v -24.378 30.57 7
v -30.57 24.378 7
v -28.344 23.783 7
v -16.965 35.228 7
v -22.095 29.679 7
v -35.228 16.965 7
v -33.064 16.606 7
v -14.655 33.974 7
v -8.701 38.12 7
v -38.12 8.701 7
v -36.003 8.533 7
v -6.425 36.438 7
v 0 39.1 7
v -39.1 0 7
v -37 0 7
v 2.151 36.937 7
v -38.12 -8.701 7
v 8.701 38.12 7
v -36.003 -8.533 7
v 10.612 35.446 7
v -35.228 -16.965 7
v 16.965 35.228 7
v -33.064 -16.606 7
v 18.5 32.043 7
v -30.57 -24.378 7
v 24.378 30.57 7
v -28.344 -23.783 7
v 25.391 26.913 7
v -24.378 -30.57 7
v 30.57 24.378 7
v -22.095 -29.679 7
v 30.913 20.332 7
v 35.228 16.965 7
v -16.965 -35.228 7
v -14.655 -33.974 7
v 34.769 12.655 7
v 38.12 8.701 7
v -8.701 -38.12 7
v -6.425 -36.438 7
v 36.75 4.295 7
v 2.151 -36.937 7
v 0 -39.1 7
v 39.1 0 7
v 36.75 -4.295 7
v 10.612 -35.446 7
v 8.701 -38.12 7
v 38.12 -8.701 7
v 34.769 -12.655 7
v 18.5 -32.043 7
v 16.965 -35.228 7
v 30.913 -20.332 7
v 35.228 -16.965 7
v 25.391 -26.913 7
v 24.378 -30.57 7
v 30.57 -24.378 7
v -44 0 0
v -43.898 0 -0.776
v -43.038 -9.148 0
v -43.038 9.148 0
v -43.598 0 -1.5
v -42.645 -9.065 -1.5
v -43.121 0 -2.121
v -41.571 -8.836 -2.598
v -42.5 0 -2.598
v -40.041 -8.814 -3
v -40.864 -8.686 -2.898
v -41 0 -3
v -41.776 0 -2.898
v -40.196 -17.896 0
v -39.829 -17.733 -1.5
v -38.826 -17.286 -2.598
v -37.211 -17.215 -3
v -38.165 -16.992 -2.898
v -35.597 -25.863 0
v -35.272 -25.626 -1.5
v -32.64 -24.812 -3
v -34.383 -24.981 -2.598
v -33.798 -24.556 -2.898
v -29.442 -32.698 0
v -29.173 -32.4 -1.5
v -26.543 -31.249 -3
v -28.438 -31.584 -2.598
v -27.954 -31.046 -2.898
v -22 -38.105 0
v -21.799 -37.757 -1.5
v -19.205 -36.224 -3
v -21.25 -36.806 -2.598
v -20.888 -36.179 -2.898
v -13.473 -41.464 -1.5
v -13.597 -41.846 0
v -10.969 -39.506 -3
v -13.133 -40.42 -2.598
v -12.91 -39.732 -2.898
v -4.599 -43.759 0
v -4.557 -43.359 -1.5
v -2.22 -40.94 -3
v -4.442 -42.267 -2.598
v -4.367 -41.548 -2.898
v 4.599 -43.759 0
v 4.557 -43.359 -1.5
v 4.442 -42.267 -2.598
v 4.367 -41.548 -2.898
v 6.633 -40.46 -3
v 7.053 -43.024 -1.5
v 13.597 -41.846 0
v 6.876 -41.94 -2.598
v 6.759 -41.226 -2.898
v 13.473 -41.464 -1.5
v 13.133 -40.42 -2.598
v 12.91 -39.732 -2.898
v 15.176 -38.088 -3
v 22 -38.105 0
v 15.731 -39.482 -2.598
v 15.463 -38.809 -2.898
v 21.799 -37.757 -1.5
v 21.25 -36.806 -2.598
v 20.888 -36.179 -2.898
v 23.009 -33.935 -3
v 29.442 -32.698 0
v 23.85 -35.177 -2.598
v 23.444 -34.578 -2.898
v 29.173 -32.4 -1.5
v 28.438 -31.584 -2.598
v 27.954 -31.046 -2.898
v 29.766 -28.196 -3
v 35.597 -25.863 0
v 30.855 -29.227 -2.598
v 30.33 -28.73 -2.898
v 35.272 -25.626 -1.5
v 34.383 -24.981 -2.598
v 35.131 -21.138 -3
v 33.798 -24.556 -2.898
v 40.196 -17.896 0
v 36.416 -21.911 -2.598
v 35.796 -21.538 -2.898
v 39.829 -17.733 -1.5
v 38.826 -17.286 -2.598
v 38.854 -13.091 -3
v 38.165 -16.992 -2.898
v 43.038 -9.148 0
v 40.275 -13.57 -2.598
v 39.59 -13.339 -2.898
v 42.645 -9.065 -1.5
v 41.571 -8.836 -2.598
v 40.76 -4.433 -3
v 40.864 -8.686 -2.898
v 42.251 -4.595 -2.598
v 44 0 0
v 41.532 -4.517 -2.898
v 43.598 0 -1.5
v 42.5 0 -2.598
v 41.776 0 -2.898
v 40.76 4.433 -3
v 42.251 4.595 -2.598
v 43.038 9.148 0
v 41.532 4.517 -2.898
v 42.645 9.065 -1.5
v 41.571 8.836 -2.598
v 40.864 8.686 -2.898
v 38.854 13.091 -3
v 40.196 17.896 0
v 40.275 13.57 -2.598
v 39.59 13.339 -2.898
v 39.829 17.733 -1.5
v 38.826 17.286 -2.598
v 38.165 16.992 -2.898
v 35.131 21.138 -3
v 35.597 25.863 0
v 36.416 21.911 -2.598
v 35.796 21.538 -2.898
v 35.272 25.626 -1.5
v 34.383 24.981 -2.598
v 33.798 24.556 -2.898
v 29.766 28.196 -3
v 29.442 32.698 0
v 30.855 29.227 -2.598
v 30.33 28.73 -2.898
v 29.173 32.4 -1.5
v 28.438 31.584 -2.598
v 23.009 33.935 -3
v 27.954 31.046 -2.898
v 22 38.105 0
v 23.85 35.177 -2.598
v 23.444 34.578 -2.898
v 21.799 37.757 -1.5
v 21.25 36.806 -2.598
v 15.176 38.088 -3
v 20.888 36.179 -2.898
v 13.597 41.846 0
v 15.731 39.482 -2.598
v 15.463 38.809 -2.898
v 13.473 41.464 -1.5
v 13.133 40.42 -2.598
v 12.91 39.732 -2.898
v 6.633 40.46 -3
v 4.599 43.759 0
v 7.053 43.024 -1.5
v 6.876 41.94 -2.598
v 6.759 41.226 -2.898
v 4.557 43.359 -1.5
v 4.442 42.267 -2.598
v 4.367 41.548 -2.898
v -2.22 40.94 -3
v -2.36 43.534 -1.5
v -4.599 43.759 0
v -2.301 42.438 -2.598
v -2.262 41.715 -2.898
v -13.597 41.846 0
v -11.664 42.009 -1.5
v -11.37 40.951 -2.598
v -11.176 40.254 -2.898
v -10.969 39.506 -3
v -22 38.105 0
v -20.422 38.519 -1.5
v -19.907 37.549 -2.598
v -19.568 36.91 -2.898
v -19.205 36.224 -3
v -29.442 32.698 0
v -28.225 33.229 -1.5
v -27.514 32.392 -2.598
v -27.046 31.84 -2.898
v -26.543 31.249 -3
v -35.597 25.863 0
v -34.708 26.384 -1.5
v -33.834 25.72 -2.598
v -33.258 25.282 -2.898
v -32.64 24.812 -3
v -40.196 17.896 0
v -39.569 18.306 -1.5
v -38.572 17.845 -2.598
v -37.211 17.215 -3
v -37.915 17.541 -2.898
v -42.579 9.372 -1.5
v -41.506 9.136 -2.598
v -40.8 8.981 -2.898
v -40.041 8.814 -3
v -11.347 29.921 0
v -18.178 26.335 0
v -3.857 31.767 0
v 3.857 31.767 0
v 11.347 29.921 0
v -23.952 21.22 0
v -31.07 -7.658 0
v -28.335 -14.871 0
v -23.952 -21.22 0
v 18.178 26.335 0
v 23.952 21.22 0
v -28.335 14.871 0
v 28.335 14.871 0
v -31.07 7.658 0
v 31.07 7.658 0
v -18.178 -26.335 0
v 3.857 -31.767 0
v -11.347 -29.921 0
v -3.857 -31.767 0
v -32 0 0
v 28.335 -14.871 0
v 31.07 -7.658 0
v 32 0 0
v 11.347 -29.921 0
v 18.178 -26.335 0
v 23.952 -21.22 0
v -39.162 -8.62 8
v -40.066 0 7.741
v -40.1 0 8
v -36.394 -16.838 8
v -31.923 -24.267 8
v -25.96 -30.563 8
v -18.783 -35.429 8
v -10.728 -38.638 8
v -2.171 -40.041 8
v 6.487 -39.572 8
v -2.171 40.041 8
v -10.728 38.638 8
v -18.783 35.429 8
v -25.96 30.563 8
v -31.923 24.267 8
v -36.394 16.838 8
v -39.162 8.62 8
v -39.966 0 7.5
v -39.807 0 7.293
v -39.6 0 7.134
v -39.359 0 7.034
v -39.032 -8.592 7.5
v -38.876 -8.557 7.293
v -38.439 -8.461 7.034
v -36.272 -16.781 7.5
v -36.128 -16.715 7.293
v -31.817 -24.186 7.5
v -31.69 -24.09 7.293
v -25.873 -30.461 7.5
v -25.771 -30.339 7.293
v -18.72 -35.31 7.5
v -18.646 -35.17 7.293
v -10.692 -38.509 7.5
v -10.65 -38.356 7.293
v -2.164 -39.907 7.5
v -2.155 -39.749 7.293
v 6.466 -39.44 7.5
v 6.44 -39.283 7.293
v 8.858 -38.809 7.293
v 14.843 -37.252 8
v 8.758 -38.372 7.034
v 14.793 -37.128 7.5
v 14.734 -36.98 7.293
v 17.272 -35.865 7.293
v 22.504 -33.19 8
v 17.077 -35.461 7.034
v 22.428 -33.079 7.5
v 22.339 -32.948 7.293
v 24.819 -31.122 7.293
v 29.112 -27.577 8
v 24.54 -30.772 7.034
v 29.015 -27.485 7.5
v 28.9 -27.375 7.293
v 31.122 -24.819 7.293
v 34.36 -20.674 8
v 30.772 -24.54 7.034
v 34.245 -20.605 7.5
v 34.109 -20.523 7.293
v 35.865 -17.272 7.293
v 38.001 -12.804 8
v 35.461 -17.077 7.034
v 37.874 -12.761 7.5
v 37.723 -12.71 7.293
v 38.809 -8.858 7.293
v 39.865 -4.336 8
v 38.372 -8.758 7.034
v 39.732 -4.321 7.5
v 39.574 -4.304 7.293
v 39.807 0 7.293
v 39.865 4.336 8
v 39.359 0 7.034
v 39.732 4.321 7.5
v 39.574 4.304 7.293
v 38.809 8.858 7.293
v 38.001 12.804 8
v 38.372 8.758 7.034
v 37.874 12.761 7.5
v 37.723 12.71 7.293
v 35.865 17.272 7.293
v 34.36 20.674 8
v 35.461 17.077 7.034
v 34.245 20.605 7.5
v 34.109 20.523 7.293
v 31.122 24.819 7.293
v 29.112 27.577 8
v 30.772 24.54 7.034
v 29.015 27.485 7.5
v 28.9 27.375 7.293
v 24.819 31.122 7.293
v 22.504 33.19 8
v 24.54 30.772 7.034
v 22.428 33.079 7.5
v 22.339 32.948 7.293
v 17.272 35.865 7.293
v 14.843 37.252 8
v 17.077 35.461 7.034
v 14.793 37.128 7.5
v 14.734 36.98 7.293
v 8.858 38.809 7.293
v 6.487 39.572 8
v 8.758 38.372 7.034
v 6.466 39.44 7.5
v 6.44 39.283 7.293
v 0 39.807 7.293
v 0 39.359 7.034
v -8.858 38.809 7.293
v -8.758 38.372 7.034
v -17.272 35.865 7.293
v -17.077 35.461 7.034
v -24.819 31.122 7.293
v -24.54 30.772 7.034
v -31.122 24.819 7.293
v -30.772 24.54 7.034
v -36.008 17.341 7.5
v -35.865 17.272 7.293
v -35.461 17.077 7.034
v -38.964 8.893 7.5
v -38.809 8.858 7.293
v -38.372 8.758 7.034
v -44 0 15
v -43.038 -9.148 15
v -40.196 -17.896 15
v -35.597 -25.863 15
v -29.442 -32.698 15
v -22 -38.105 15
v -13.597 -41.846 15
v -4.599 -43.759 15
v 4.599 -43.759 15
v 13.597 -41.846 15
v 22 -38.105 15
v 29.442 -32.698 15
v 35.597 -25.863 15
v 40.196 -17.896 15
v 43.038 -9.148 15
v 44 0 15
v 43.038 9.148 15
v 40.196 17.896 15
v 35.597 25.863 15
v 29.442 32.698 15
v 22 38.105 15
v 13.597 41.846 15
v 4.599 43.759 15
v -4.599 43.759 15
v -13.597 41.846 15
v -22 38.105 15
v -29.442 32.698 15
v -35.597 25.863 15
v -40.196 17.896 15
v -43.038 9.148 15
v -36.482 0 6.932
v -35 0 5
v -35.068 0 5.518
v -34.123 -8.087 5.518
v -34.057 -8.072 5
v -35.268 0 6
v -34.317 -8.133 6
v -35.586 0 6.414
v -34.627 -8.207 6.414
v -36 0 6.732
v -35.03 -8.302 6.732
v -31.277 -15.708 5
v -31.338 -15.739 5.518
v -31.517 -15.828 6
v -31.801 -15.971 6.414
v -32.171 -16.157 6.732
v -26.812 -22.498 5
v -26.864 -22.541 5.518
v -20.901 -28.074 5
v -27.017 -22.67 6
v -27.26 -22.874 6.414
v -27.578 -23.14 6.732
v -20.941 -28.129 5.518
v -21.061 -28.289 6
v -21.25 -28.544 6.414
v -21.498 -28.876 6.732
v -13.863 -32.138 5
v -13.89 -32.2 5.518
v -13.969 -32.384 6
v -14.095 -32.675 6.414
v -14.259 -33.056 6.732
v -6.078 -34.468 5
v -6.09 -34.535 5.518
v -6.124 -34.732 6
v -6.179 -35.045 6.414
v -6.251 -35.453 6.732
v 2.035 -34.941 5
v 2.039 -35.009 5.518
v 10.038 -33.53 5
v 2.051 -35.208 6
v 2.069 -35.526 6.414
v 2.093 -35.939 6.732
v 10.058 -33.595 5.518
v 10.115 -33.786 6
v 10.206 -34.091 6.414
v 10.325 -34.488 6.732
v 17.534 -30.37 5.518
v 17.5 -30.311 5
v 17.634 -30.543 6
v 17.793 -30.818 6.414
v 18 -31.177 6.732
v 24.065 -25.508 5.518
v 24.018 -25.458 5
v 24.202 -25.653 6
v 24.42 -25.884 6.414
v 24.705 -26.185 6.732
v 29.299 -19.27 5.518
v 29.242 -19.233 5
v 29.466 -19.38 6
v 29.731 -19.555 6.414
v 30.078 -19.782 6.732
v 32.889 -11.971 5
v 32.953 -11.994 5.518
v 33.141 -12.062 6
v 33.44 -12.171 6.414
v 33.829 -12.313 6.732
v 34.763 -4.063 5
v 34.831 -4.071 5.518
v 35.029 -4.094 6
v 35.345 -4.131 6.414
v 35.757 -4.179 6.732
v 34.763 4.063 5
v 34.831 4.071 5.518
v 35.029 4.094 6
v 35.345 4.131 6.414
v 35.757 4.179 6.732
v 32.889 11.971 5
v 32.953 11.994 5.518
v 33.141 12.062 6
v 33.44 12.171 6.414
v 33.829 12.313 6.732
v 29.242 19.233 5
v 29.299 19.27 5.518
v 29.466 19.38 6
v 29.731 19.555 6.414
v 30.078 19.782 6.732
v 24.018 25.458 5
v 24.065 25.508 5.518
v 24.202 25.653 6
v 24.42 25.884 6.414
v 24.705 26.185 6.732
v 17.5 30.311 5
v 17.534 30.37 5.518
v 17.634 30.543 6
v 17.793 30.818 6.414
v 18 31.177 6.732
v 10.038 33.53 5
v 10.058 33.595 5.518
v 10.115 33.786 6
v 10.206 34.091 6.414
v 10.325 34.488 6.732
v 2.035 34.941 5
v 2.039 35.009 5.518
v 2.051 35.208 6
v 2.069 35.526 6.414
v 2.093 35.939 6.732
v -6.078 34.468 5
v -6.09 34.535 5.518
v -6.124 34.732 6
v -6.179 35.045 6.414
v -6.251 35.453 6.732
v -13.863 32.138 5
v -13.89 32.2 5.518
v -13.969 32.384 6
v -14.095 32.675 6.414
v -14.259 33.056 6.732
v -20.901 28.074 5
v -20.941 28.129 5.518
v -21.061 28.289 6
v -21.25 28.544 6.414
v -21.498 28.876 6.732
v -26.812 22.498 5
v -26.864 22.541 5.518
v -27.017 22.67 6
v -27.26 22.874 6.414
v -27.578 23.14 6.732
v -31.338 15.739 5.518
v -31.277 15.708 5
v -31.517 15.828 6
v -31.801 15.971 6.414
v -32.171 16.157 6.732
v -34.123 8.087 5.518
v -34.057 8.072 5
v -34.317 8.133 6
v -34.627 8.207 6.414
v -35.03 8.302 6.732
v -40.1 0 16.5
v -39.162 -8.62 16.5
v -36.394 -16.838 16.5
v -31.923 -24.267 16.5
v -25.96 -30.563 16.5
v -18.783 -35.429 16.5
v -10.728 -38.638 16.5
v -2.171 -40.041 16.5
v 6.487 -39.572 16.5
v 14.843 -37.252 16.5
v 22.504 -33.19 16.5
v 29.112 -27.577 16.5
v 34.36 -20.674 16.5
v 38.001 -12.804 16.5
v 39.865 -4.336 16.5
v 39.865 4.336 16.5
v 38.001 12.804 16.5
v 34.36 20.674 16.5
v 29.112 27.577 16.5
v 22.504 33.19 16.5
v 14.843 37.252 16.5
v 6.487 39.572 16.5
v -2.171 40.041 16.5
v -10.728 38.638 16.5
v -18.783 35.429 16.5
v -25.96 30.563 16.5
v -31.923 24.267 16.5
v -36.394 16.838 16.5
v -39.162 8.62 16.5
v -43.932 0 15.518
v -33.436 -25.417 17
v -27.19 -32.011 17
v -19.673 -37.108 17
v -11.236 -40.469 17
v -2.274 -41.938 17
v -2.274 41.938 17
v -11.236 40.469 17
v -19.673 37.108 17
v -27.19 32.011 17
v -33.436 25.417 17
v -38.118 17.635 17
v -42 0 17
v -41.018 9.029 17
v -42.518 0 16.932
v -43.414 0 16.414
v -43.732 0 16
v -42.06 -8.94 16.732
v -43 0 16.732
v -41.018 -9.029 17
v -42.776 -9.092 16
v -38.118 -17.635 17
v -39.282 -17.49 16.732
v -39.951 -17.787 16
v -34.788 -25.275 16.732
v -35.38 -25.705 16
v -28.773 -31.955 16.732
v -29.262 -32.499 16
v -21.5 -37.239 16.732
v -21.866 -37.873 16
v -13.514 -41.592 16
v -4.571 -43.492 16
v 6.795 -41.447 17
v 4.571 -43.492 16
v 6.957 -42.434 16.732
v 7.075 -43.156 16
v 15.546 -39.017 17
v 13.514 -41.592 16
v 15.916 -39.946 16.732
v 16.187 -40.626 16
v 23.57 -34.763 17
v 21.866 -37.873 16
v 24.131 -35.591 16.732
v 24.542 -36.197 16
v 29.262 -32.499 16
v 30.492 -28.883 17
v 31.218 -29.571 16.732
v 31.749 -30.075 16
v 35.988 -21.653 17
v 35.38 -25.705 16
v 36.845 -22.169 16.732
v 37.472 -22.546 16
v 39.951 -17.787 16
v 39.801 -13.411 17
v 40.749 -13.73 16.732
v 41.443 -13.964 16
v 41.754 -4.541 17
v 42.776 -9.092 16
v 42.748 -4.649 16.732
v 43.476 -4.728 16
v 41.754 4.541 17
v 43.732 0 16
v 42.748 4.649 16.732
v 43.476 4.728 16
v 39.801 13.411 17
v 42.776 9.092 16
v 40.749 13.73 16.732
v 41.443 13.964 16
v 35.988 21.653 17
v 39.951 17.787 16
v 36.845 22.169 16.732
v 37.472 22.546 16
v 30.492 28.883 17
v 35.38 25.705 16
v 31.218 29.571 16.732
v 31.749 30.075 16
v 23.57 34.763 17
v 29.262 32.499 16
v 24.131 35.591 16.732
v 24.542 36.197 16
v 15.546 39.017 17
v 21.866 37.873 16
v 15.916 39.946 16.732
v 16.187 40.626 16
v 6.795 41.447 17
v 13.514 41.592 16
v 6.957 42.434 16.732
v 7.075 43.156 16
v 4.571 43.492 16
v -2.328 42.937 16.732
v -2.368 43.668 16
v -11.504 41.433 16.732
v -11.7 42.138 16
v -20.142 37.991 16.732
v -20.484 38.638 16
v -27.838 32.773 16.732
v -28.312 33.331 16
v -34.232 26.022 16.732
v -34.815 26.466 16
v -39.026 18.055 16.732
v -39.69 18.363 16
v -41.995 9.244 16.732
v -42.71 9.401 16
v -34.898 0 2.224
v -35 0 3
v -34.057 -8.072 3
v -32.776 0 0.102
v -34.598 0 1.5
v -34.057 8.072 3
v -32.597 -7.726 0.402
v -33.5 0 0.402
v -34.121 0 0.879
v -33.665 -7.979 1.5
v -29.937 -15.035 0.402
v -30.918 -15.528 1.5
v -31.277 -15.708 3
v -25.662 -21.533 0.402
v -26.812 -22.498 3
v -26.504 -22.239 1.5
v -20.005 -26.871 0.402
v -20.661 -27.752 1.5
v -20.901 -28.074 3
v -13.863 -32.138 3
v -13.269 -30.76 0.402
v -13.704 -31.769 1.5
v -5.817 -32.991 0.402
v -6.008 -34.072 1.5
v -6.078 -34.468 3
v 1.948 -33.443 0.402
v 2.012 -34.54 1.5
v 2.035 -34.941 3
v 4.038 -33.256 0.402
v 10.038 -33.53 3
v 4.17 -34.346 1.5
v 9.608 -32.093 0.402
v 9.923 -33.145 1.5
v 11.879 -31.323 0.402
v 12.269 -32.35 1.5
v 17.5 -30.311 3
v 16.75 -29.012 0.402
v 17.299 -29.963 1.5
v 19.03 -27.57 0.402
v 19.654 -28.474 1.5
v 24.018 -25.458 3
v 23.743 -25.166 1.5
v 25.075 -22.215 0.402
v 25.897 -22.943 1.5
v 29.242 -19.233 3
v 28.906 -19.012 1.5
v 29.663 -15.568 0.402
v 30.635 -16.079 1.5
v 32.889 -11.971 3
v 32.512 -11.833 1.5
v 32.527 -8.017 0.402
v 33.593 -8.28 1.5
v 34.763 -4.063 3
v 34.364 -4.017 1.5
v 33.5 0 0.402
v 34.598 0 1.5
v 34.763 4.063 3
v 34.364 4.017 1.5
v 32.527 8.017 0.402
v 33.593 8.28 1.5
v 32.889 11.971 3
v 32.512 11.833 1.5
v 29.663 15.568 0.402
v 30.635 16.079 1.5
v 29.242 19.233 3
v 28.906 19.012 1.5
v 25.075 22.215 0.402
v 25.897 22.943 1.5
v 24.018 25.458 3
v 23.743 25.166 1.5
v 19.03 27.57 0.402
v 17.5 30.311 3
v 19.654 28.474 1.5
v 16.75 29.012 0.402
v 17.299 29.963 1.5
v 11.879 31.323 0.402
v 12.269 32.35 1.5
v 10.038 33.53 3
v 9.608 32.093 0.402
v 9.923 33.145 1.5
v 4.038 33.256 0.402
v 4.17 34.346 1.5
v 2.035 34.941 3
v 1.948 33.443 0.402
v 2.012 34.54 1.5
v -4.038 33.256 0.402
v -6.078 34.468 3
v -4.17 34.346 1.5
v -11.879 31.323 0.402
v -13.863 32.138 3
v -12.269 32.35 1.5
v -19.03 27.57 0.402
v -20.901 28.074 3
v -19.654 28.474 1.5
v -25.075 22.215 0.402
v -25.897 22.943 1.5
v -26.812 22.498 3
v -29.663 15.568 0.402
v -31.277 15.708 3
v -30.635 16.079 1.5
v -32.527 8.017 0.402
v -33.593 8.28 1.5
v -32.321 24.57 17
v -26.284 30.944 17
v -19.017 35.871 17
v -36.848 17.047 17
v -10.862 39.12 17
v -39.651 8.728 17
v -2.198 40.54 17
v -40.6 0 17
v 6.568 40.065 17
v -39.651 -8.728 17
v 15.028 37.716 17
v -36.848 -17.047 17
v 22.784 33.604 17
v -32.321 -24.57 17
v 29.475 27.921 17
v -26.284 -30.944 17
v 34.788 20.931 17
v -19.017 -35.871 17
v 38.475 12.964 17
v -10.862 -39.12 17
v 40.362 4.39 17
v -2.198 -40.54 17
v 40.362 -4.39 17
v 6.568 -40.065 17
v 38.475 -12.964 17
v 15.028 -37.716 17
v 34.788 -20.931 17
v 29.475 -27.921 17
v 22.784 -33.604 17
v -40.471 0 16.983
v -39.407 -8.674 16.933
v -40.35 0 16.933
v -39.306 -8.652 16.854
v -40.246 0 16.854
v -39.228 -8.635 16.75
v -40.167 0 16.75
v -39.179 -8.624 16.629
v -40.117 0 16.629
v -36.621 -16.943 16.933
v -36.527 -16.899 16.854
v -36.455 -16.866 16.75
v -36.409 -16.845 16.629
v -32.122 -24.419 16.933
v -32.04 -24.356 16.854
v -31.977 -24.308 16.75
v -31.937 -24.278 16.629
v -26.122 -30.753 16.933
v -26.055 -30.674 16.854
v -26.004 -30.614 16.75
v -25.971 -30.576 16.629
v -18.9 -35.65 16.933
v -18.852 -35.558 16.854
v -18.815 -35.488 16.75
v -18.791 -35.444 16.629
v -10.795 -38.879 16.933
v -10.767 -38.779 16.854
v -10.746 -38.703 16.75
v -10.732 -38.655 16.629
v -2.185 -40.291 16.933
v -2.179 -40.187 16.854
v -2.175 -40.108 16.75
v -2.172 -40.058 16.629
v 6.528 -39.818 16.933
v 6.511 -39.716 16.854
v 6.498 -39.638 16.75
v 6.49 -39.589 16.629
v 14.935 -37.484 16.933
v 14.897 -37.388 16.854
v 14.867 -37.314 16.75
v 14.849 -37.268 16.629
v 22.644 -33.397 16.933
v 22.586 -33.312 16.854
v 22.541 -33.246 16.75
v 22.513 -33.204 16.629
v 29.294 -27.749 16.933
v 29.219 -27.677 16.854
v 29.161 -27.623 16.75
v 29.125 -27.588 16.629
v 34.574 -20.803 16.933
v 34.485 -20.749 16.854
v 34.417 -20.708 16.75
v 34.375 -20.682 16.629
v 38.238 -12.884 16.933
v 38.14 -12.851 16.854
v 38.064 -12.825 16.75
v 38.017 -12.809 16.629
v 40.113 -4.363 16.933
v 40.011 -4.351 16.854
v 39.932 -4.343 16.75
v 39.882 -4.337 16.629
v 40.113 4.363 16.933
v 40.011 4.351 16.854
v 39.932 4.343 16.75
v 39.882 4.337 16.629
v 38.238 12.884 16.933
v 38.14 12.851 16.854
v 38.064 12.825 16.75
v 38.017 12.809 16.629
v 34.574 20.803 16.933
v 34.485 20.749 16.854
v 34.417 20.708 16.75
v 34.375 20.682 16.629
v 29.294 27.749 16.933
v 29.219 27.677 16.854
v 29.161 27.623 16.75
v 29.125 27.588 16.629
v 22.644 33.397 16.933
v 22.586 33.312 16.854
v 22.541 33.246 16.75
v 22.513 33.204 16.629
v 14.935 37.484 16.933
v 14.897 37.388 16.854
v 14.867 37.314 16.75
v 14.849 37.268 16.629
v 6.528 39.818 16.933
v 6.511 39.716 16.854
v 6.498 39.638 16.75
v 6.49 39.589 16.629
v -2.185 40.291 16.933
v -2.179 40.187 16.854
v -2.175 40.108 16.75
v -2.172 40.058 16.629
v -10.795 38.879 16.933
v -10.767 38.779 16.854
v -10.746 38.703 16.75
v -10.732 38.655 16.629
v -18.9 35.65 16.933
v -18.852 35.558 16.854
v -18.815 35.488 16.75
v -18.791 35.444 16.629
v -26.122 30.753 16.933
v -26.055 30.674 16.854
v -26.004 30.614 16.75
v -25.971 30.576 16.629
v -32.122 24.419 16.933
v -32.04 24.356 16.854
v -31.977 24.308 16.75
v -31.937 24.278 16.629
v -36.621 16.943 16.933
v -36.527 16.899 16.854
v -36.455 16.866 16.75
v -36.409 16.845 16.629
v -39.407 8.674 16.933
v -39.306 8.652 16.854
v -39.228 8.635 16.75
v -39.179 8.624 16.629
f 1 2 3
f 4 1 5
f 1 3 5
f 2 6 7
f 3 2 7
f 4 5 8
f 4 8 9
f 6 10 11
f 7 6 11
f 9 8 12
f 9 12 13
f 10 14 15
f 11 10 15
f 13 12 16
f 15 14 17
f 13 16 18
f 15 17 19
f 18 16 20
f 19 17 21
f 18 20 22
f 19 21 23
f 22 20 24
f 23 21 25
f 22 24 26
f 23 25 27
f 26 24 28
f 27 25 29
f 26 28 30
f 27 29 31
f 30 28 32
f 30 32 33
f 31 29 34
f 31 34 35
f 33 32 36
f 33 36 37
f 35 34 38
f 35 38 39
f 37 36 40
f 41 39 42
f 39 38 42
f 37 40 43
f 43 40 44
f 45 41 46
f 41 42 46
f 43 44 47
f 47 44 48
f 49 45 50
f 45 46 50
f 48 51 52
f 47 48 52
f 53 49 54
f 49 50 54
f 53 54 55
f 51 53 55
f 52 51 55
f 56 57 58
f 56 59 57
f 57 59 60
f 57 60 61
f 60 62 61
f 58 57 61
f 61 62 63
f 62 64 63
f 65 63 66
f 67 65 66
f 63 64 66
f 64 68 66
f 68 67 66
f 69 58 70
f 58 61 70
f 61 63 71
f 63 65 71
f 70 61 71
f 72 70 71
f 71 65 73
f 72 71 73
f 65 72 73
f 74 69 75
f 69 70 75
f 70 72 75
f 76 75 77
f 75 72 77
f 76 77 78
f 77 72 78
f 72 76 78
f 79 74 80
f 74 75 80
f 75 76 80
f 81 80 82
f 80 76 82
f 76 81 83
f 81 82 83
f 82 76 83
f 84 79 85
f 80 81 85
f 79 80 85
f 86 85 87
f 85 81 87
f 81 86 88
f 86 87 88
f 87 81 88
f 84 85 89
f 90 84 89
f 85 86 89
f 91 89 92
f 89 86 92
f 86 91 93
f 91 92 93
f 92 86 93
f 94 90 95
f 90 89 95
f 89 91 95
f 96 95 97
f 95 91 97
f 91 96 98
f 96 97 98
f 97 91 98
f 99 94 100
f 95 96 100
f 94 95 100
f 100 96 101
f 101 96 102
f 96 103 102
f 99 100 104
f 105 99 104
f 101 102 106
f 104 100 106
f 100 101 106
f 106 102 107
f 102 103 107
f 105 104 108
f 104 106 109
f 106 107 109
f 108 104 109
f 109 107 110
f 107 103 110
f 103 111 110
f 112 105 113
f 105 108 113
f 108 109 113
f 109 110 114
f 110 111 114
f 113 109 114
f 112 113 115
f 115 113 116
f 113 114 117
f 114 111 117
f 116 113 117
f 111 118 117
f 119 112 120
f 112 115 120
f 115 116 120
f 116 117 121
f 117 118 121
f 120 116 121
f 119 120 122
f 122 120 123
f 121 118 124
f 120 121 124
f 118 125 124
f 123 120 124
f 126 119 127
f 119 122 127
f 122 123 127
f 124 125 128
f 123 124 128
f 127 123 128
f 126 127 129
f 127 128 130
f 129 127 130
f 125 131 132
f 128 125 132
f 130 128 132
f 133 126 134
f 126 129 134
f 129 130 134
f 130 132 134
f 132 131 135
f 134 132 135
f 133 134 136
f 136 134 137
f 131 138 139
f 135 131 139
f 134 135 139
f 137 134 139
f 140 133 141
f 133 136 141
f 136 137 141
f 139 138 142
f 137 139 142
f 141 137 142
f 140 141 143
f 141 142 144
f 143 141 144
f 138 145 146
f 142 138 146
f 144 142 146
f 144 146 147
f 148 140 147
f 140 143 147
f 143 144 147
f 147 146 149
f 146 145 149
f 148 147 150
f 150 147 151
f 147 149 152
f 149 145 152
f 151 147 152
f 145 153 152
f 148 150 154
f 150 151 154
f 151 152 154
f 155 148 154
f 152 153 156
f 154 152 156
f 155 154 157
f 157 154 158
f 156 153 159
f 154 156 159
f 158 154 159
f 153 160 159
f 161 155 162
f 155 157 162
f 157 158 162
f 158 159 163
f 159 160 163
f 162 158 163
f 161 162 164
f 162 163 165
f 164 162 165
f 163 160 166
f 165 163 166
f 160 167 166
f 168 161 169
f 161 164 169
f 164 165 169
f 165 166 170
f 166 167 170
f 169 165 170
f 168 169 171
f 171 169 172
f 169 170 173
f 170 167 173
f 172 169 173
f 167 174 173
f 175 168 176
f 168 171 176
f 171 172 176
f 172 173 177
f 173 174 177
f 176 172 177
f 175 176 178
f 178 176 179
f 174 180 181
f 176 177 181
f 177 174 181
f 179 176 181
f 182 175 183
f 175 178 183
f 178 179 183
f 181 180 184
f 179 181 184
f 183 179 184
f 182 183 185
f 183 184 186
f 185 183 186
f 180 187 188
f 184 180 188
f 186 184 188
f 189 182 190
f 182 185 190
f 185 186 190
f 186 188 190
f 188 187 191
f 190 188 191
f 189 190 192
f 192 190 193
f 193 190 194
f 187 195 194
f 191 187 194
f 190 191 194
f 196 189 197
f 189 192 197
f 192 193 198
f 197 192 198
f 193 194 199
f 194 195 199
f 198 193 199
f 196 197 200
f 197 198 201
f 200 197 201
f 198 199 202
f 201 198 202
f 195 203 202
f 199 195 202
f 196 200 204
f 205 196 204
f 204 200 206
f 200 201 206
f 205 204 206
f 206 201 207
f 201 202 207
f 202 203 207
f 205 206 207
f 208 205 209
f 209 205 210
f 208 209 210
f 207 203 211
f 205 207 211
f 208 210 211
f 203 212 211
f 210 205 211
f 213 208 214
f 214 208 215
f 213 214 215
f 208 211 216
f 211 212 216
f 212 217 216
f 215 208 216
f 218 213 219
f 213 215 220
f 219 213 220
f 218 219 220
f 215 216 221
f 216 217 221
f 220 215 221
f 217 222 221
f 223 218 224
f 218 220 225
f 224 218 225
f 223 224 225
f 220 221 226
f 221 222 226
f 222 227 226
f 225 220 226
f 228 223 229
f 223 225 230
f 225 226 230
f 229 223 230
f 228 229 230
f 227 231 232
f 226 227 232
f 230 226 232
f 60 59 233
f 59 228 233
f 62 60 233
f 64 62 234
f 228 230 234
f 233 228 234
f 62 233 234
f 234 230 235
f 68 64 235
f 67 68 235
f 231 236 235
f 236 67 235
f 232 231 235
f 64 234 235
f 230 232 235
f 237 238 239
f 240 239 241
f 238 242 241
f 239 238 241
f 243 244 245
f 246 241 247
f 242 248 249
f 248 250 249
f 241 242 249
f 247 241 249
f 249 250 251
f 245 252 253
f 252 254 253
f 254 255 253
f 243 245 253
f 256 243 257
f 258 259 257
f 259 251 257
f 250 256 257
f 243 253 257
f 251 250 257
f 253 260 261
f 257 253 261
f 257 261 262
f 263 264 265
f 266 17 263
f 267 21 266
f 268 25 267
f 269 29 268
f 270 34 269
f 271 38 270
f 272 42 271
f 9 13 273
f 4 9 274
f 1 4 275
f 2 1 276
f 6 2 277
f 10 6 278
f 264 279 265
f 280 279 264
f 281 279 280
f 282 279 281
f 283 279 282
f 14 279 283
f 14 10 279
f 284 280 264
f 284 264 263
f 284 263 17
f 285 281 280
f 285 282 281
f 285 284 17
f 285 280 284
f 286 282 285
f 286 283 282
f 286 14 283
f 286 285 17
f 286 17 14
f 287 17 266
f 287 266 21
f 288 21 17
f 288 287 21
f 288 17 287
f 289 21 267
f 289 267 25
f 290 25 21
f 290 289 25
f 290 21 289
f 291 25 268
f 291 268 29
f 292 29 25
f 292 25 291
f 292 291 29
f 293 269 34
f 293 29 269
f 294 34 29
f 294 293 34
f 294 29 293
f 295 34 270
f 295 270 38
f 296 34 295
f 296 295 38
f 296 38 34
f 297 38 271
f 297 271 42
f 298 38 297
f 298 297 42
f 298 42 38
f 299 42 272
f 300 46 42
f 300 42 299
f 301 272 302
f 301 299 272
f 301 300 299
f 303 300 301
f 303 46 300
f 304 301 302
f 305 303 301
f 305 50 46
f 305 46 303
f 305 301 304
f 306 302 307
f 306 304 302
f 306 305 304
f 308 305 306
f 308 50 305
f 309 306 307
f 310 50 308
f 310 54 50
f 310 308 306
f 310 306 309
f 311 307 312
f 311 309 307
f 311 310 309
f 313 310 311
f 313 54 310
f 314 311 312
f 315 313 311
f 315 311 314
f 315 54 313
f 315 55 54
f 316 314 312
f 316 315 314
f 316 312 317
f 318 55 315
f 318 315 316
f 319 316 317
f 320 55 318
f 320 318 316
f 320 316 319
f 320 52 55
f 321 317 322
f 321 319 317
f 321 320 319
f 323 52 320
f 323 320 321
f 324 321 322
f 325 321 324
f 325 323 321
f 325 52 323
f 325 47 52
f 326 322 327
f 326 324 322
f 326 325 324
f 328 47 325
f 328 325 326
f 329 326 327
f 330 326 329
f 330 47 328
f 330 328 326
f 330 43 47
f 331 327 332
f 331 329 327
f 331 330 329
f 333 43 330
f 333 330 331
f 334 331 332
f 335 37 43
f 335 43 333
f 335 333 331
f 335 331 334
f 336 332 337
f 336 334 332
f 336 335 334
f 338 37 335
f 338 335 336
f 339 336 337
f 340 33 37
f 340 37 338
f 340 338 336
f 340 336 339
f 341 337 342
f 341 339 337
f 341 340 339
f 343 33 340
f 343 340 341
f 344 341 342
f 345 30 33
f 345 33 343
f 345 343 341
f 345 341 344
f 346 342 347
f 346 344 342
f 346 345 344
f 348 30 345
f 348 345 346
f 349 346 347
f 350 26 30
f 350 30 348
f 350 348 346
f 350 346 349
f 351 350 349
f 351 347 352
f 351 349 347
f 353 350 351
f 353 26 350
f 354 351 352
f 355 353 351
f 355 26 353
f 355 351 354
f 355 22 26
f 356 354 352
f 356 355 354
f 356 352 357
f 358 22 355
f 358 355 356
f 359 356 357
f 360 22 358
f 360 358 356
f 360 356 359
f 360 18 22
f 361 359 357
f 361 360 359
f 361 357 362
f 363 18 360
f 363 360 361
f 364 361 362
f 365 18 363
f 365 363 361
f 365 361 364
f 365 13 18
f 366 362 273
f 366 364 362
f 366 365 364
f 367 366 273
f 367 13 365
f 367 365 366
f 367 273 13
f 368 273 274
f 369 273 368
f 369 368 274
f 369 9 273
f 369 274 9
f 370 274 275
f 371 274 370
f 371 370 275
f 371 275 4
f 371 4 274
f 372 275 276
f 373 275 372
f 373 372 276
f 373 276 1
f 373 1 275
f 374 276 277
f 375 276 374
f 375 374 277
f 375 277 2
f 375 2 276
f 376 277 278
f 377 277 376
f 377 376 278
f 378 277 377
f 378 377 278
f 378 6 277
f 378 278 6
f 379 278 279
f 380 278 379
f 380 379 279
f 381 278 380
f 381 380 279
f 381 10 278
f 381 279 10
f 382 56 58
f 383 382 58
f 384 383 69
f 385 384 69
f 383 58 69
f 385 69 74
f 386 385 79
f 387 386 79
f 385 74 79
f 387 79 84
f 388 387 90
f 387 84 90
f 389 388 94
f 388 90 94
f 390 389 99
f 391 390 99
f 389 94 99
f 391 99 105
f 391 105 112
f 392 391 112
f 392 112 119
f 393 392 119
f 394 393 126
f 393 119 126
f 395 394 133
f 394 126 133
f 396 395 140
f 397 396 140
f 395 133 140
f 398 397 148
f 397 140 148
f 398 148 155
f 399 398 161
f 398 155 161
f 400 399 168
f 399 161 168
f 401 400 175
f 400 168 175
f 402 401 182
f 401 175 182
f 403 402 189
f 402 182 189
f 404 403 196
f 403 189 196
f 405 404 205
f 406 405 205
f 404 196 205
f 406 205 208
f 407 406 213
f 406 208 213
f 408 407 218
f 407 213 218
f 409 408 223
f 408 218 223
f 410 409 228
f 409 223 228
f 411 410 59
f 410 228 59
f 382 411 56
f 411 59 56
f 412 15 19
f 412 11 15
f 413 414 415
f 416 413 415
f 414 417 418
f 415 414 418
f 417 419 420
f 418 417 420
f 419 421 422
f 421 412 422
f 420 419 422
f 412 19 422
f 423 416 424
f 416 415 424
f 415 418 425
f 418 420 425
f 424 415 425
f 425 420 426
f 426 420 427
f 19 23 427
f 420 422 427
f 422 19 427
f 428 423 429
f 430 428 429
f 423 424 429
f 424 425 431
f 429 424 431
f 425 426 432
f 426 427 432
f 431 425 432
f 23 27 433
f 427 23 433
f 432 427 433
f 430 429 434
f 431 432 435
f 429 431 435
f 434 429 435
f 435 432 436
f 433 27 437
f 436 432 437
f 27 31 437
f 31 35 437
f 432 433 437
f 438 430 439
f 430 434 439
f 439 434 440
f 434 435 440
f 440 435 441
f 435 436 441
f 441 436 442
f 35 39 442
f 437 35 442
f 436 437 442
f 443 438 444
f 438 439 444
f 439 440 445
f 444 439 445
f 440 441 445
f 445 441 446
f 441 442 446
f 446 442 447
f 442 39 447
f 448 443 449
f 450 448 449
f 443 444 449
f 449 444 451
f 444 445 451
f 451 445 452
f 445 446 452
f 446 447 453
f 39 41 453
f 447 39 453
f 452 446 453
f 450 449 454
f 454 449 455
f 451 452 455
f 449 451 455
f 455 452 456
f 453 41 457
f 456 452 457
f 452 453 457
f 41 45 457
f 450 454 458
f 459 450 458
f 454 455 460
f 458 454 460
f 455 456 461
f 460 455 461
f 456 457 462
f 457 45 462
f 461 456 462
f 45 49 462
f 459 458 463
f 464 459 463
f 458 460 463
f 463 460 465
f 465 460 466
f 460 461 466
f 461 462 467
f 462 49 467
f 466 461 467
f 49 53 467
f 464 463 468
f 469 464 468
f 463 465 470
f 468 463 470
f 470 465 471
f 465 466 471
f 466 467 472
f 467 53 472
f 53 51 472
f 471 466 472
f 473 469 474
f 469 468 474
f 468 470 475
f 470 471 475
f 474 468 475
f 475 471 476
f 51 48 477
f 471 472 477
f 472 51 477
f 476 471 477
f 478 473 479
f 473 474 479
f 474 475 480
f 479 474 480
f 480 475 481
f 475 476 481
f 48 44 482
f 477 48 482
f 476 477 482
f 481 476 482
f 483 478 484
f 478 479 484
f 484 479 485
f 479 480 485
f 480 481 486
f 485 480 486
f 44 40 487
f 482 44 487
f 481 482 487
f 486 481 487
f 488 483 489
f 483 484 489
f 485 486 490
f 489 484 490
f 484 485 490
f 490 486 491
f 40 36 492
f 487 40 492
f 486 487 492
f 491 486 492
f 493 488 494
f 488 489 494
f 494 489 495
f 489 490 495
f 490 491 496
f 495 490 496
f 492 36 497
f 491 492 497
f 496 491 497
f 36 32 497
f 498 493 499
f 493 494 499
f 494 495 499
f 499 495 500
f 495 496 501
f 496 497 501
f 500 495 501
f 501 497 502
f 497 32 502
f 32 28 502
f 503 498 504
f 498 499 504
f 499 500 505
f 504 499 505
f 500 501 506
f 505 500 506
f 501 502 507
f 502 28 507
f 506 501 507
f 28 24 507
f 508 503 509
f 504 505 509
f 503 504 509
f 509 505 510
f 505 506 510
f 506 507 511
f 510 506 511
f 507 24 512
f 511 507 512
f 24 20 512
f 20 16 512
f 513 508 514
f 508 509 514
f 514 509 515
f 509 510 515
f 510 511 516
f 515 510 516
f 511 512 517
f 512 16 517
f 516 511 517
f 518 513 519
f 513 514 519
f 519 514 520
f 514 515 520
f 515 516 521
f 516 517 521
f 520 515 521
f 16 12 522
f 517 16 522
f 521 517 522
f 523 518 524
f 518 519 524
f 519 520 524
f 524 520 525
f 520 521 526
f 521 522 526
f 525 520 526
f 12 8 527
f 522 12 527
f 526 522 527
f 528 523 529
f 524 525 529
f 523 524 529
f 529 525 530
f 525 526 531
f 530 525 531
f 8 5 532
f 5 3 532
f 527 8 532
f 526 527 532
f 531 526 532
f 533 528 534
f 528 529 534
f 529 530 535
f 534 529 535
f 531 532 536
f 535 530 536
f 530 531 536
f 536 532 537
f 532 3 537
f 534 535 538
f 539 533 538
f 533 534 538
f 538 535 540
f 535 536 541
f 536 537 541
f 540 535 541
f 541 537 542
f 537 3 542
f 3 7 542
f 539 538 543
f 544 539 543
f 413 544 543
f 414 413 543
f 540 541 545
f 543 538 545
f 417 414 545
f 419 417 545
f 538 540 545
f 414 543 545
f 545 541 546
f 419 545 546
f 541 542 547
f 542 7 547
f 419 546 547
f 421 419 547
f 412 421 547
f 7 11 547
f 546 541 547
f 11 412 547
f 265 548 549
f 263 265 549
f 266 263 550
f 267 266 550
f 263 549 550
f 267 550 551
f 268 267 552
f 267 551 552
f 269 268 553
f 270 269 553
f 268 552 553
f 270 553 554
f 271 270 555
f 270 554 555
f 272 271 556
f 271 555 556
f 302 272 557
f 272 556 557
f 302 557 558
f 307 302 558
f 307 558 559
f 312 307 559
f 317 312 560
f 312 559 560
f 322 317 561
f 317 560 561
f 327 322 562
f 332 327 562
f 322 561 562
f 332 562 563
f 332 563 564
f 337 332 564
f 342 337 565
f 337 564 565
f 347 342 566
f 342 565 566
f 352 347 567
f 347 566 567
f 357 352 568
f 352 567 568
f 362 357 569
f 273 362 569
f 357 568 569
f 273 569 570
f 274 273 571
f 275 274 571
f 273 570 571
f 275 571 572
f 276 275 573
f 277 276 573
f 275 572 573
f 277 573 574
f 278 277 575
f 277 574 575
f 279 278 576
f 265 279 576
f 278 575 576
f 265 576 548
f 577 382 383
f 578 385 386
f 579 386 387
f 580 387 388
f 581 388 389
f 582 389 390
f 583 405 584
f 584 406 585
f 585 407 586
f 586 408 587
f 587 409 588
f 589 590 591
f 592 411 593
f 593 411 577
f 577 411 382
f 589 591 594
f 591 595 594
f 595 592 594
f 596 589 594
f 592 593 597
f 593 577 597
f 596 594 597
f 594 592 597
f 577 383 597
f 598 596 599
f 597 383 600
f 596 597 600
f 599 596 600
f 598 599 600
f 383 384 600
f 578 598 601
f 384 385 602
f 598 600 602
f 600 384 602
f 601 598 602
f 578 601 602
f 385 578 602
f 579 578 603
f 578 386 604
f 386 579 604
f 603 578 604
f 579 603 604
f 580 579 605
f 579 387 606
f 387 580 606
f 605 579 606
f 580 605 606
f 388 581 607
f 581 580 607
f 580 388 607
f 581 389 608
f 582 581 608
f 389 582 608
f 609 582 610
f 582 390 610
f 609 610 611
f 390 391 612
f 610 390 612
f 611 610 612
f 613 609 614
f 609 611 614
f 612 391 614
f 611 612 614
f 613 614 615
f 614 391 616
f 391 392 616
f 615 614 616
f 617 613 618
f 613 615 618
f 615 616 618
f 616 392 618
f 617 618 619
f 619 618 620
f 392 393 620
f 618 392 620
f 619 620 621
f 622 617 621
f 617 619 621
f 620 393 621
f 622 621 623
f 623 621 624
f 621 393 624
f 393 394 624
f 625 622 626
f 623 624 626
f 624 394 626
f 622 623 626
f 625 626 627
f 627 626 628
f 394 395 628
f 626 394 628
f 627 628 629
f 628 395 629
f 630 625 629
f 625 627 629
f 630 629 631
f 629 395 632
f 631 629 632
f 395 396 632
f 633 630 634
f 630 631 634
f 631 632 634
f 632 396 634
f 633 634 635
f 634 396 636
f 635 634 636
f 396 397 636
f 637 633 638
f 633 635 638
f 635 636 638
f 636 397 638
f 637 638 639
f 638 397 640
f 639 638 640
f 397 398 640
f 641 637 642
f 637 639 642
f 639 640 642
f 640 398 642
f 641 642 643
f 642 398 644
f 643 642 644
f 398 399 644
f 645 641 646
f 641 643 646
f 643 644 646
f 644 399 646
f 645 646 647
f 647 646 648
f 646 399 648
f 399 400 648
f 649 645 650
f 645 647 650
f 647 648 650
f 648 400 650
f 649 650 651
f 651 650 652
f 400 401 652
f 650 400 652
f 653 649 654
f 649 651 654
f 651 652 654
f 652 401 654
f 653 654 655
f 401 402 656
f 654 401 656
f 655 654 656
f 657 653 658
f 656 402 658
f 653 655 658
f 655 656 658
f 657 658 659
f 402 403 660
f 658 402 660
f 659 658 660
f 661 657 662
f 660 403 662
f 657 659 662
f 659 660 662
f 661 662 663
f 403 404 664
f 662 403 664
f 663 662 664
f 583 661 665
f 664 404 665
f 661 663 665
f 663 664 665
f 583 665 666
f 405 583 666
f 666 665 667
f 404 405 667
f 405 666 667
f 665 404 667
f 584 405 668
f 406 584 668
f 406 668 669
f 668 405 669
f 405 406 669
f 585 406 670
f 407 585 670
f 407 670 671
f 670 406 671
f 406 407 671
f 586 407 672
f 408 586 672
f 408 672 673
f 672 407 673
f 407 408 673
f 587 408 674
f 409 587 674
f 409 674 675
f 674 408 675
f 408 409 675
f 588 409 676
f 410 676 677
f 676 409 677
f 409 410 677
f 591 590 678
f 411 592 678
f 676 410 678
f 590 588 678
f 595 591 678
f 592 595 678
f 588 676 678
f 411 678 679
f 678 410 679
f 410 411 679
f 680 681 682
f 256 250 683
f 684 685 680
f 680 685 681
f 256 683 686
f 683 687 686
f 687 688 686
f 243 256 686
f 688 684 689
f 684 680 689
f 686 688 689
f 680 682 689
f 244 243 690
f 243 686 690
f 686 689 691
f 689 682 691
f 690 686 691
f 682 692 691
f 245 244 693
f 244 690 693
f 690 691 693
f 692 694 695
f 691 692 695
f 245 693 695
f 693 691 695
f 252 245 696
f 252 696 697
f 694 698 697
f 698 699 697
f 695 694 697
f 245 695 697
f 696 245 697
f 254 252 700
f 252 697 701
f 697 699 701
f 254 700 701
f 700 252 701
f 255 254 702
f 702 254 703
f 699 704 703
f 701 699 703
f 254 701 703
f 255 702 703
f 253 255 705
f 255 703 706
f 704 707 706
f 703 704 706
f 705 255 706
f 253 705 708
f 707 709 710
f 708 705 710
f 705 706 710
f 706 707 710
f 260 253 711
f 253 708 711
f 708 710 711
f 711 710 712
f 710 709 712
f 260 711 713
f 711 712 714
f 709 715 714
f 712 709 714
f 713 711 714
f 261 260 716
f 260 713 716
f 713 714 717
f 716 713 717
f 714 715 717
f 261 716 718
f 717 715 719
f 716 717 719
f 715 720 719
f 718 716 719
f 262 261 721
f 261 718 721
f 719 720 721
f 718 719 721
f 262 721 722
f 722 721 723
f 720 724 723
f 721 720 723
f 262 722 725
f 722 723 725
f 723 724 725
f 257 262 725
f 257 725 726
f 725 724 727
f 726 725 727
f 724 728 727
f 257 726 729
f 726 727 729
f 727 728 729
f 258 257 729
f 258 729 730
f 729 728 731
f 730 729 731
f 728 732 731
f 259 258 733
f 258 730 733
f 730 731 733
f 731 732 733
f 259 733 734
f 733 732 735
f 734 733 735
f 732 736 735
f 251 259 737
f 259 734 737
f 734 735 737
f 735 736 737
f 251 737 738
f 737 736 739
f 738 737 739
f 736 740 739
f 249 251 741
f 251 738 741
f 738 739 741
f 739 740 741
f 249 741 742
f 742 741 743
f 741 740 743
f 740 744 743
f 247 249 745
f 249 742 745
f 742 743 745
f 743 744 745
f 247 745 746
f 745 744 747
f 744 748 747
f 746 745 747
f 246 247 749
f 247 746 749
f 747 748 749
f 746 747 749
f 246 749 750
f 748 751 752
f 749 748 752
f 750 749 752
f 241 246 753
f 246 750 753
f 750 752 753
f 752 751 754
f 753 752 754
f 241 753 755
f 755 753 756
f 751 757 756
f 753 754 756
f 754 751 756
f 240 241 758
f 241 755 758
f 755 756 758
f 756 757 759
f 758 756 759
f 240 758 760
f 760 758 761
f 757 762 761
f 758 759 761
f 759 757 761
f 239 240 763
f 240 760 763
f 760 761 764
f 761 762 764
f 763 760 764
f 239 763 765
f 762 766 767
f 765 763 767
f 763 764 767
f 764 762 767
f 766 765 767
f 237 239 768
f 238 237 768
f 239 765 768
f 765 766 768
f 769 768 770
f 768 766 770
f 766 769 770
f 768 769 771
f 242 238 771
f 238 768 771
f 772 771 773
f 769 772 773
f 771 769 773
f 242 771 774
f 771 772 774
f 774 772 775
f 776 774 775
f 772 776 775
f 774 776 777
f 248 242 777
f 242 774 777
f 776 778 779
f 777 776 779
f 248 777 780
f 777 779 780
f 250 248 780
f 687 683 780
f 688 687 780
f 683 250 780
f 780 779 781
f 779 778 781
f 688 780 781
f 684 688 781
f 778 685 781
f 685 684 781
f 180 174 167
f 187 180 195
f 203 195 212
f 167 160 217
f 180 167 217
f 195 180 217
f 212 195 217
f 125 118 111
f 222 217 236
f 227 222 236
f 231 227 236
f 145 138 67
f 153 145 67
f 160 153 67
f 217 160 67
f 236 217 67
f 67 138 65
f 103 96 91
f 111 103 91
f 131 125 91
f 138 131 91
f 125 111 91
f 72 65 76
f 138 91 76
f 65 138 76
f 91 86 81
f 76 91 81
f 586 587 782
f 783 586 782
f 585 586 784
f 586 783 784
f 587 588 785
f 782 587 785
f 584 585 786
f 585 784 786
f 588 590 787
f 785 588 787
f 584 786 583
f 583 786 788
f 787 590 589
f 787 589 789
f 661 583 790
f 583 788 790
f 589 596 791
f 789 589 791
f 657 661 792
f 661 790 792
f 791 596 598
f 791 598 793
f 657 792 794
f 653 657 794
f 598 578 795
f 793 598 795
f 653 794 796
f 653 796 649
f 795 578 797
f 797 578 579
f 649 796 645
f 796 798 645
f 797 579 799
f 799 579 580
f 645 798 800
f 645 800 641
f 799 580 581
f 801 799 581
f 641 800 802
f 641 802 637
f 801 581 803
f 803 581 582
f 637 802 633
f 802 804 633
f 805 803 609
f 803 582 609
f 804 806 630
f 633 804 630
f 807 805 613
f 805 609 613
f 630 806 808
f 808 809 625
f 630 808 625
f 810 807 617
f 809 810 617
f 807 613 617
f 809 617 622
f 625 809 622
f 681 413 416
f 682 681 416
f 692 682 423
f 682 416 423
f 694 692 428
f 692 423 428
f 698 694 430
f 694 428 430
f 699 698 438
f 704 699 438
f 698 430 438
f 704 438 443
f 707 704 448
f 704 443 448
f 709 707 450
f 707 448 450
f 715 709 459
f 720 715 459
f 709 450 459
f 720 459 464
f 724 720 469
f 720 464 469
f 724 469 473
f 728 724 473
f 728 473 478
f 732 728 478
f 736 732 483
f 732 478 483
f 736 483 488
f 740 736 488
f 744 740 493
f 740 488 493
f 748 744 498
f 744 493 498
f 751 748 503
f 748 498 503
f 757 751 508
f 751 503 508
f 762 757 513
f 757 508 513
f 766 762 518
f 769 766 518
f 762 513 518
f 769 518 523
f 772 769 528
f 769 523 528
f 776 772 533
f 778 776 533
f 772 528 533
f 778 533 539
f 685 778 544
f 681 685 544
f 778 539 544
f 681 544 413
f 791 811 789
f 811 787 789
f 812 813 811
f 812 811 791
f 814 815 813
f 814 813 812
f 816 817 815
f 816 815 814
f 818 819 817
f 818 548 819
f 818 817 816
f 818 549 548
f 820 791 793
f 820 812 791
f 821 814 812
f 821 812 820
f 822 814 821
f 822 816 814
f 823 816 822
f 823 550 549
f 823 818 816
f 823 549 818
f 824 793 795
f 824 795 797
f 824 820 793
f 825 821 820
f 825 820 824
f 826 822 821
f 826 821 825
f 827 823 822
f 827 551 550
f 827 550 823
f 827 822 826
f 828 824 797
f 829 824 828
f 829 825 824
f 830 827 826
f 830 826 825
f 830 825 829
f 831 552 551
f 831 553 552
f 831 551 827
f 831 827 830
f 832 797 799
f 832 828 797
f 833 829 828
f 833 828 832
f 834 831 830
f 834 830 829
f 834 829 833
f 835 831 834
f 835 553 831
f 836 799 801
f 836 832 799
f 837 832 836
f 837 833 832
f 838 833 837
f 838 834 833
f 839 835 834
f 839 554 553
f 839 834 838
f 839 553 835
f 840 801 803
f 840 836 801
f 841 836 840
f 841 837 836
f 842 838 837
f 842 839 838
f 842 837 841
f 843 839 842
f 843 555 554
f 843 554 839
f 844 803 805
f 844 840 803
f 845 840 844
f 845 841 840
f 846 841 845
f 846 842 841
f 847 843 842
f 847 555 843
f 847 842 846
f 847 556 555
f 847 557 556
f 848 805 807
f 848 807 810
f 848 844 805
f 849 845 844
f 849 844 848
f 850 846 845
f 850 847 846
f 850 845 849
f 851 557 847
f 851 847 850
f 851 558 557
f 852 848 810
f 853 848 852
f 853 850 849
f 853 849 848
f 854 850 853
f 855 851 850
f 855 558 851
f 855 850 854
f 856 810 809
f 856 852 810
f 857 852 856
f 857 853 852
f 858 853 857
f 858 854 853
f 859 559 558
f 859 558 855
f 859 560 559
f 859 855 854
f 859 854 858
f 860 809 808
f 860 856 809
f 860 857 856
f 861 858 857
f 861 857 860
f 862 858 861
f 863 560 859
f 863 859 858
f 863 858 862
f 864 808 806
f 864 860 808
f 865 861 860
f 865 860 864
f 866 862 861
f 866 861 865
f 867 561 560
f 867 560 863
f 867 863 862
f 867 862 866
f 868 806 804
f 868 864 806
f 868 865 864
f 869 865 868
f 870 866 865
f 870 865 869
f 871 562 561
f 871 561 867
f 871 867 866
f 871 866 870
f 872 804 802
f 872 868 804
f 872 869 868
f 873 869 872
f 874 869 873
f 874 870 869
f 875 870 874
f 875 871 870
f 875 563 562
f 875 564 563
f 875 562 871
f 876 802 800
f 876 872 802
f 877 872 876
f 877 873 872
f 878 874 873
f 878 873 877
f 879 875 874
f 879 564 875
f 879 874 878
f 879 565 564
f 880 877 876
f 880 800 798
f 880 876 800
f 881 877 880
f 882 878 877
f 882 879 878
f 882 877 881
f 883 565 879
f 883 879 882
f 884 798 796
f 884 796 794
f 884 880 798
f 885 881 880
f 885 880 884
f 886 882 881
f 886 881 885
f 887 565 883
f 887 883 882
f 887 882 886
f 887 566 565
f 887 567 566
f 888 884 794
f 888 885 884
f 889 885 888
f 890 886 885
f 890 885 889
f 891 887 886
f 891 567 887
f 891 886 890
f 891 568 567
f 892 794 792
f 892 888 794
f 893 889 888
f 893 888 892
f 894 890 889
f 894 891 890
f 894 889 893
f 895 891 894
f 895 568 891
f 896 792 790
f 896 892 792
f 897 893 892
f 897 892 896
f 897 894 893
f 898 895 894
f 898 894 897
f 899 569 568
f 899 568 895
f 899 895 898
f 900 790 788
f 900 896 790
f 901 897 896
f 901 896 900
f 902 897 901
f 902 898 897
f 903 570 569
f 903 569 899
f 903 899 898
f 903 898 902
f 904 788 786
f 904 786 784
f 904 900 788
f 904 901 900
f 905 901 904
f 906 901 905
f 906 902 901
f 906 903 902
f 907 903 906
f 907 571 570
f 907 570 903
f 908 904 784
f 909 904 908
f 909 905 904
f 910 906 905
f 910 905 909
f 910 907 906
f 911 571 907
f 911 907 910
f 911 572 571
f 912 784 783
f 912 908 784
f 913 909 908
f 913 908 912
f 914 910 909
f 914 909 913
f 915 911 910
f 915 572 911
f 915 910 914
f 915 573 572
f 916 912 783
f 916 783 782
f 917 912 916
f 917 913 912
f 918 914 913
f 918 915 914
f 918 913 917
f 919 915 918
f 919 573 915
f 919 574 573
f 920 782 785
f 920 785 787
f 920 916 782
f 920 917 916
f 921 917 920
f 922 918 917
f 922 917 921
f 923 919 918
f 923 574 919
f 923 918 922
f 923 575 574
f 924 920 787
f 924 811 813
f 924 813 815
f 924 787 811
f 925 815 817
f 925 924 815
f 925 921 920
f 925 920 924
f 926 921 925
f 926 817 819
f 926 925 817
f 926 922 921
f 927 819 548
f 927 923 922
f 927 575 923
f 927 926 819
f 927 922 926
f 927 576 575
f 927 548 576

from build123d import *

# Parameters (mm, degrees)
F2_R = 3
F3_R = 2
F4_R = 2
F5_R = 0.5
F6_R = 1


with BuildPart() as f1:
    # F0 (on Front) → F1 (revolve)
    with BuildSketch(Plane.XZ):
        with BuildLine():
            Line((0, -3), (0, 0))
            Line((0, 0), (-35, 0))
            Line((-35, 0), (-35, 7))
            Line((-35, 7), (-40.1, 7))
            Line((-40.1, 7), (-40.1, 17))
            Line((-40.1, 17), (-44, 17))
            Line((-44, 17), (-44, 0))
            ThreePointArc((-44, 0), (-43.12132, -2.12132), (-41, -3))
            Line((-41, -3), (0, -3))
        make_face()
    revolve(axis=Axis((0, 0, -1.5), (0, 0, 1)))

    # F2
    f2_edges = [f1.edges().sort_by_distance(p)[0] for p in [
        (35, 0, 0),
    ]]
    fillet(f2_edges, radius=F2_R)

    # F3
    f3_edges = [f1.edges().sort_by_distance(p)[0] for p in [
        (35, 0, 7),
    ]]
    fillet(f3_edges, radius=F3_R)

    # F4
    f4_edges = [f1.edges().sort_by_distance(p)[0] for p in [
        (44, 0, 17),
    ]]
    fillet(f4_edges, radius=F4_R)

    # F5
    f5_edges = [f1.edges().sort_by_distance(p)[0] for p in [
        (40.1, 0, 17),
    ]]
    fillet(f5_edges, radius=F5_R)

    # F6
    f6_edges = [f1.edges().sort_by_distance(p)[0] for p in [
        (40.1, 0, 7),
    ]]
    fillet(f6_edges, radius=F6_R)


solid = f1.part
